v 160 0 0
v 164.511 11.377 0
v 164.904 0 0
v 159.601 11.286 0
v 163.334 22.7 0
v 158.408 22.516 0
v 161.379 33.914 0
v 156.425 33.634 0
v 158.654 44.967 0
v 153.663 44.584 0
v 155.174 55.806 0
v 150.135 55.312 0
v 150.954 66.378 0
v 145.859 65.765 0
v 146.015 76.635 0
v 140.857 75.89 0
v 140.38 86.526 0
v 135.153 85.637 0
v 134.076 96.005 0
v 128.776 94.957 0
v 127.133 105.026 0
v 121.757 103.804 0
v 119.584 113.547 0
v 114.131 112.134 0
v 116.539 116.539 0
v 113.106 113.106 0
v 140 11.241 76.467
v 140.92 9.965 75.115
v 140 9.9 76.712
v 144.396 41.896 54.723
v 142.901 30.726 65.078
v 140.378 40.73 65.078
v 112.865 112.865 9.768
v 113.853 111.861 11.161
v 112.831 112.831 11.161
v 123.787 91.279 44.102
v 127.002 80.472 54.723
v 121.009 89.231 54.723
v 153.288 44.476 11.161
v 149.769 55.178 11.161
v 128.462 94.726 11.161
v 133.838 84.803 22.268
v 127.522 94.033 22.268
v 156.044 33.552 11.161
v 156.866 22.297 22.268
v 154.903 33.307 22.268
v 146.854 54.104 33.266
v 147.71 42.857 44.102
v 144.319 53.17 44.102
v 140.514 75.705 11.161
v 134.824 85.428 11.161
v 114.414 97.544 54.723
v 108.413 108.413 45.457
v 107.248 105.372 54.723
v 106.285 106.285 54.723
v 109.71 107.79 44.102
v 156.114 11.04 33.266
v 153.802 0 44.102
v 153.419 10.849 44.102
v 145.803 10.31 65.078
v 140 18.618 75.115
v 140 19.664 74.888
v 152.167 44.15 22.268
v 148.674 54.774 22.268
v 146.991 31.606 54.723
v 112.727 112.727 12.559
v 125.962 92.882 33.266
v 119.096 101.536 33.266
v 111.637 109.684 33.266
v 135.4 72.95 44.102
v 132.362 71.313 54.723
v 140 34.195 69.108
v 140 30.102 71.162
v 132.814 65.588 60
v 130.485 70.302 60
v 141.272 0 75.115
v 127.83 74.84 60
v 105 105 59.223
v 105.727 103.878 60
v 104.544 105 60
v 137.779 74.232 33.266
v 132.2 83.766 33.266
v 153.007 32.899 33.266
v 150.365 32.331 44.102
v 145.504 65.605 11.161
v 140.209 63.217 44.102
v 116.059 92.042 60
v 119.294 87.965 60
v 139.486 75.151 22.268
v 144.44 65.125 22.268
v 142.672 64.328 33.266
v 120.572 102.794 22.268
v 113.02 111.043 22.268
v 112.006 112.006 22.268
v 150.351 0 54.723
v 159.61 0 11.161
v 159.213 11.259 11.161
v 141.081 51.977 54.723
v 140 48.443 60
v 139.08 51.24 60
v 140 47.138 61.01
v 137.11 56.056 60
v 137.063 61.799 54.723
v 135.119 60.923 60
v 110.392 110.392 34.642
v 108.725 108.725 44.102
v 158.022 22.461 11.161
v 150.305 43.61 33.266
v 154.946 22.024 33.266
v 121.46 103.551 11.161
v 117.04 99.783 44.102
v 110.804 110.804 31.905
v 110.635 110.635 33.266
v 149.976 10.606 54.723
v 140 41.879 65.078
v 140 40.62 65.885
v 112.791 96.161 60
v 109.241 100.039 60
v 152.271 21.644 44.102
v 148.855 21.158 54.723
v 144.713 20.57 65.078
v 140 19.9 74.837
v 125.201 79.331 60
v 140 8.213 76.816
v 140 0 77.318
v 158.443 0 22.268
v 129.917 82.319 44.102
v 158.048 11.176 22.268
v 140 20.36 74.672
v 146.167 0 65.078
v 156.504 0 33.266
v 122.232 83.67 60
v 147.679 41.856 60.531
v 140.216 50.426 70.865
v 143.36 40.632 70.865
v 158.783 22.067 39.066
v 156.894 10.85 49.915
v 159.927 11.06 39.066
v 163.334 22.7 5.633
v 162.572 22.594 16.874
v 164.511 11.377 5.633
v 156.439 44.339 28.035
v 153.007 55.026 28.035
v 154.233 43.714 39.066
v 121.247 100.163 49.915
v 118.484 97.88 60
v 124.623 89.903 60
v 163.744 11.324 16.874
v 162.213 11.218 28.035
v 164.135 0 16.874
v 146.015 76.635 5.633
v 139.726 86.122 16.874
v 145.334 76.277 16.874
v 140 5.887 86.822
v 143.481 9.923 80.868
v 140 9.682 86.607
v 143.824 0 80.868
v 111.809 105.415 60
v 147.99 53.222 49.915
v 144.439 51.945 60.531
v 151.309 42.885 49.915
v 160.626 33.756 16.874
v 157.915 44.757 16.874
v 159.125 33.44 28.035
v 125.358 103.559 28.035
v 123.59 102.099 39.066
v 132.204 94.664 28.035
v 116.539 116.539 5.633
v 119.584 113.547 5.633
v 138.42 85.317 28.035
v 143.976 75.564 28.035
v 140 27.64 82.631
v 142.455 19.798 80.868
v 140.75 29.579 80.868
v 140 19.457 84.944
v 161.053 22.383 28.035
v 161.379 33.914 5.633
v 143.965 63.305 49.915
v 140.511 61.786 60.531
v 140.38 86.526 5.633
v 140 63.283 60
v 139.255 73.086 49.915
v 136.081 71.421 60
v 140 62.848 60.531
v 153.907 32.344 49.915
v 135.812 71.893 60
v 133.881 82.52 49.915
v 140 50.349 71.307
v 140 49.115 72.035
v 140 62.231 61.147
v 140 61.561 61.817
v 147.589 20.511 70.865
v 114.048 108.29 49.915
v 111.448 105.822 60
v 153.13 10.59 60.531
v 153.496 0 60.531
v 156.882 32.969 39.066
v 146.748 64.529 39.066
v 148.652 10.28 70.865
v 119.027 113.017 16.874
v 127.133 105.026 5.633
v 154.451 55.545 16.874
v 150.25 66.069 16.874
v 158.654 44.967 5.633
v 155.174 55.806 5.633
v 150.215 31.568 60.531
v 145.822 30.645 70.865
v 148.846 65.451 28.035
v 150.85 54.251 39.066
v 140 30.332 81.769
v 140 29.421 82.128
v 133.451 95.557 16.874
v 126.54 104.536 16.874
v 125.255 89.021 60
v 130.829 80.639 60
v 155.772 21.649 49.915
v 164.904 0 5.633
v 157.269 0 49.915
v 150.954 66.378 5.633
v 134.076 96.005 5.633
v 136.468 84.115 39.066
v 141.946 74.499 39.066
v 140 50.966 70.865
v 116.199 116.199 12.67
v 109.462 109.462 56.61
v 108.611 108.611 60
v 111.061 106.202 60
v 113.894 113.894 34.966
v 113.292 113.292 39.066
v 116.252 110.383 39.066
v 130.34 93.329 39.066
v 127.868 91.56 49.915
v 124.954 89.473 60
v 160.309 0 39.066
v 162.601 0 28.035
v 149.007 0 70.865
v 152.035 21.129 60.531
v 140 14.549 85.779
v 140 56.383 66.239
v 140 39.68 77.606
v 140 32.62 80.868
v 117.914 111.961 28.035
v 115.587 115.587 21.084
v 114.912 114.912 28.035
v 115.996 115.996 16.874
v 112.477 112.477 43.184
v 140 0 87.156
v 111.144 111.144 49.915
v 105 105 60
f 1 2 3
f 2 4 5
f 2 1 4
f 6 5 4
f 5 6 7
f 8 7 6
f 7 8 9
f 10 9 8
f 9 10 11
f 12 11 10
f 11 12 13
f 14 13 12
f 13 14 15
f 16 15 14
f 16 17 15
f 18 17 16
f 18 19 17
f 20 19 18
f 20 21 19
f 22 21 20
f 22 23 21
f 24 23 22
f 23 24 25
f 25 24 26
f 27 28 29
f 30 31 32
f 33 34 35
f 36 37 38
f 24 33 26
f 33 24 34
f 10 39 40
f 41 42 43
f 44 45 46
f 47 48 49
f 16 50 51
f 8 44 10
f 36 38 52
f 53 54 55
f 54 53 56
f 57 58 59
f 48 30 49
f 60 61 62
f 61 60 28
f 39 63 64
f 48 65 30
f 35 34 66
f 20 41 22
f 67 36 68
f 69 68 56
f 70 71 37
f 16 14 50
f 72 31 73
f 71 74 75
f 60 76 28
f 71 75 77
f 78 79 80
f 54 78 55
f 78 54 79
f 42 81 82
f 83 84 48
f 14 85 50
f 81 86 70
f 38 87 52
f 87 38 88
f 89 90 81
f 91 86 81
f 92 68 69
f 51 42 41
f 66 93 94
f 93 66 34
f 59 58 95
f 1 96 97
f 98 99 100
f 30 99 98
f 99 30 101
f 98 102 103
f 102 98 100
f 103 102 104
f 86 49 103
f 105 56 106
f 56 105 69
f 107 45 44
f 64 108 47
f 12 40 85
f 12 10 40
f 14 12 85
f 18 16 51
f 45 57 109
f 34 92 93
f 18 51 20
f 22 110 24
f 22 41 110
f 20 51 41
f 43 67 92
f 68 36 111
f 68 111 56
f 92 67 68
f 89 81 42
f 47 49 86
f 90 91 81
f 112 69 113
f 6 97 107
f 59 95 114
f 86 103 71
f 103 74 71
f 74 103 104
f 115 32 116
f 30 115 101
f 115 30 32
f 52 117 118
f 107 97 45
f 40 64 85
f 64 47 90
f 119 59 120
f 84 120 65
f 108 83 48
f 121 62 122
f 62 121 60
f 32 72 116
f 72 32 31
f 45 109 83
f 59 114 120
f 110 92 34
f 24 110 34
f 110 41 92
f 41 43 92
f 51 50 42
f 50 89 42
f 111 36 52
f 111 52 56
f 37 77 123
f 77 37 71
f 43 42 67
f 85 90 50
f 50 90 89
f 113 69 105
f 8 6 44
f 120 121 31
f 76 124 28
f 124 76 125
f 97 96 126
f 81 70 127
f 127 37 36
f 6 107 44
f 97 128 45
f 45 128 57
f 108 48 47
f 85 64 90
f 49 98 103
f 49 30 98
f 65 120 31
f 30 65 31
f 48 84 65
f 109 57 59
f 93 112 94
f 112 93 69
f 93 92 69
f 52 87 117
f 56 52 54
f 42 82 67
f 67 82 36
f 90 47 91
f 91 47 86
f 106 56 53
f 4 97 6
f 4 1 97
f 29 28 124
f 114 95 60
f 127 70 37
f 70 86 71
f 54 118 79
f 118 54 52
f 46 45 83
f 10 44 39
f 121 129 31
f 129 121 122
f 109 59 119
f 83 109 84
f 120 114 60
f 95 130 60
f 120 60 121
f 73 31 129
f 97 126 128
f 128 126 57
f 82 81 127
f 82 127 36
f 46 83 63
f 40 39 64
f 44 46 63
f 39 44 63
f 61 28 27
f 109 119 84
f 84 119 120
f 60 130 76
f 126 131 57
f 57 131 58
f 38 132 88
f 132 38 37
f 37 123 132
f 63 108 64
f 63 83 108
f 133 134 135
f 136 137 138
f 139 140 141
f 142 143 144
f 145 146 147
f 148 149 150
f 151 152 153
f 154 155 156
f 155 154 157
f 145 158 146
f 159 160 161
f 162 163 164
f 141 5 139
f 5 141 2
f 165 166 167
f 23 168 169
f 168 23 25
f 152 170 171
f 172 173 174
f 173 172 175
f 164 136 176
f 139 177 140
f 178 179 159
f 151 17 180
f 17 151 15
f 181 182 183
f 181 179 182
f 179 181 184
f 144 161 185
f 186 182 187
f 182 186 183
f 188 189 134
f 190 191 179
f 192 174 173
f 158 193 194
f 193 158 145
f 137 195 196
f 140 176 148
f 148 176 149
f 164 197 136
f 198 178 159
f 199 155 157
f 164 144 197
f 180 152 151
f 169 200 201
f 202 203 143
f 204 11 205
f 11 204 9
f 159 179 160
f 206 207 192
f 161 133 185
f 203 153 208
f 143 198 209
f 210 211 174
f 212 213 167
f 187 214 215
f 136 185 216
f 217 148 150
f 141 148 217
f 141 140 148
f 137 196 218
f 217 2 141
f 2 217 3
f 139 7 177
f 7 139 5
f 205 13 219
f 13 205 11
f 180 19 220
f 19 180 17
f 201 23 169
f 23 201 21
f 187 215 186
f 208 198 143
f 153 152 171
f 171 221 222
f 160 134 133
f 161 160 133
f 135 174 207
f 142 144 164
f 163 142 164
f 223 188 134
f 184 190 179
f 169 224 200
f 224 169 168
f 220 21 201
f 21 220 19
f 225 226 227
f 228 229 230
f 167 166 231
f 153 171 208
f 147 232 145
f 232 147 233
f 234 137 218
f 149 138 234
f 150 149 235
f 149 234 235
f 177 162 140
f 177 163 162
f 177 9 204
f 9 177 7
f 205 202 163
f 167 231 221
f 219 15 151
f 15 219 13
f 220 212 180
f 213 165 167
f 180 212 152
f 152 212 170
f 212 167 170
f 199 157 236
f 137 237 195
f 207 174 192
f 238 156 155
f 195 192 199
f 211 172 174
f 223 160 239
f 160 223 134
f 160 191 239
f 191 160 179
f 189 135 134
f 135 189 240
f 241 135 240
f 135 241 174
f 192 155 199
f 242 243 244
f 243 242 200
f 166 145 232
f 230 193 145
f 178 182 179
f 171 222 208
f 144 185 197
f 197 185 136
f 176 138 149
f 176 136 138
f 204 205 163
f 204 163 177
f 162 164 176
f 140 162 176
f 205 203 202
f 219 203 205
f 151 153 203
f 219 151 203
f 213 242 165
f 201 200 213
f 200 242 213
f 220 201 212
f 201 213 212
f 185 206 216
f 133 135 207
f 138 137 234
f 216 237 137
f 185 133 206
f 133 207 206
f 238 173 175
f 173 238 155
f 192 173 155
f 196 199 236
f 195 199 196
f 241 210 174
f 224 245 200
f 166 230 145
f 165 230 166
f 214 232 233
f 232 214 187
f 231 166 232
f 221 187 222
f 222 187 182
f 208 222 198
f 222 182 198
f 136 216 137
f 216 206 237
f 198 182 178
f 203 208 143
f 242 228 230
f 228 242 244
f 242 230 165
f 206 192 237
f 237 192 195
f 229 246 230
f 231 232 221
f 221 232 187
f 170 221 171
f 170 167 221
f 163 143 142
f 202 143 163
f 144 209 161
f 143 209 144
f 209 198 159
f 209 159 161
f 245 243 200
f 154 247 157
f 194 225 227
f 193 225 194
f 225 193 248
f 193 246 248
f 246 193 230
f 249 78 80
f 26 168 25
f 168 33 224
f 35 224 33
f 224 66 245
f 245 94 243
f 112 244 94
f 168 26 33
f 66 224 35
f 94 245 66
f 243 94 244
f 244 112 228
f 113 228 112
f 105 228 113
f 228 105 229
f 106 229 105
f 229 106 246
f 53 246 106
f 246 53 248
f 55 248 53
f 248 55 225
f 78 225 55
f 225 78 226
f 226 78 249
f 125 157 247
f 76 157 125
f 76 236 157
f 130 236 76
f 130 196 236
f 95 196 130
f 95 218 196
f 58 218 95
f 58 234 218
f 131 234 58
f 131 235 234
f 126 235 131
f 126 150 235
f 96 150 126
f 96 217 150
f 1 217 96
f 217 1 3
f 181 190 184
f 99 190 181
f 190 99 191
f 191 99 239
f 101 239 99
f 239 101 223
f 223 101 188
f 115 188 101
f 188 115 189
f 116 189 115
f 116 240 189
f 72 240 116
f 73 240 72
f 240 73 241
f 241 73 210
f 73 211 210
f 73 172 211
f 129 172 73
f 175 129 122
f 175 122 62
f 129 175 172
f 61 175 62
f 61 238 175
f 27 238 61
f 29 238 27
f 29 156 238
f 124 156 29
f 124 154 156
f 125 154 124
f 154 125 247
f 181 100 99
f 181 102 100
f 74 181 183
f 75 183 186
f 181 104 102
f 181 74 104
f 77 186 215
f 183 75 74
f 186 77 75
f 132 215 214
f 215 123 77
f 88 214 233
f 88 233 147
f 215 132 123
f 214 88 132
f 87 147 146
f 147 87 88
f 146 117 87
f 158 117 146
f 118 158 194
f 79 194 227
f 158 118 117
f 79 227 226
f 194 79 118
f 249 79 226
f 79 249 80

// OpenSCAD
// file: ../motors/MN5212.scad
use <../utils.scad>

module MN5212(){

	render(){
		translate([0,0, 42.5 / 2 - 23 / 2 - 4.9 - 6])
			cylinder(
				h = 23,
				r = 59 / 2,
				$fa = fa(59 / 2),
				center = true);
		translate([0,0, 42.5 / 2 - 4.9 / 2 - 6])
			cylinder(
				h = 4.9,
				r1 = 59 / 2,
				r2 = 24.8 / 2,
				$fa = fa(59 / 2),
				center = true);
		translate([0,0, - 42.5 / 2 + 5.6 / 2 + 3])
			cylinder(
				h = 5.6,
				r1 = 44 / 2,
				r2 = 59 / 2,
				$fa = fa(59 / 2),
				center = true);
		translate([0, 0, 42.5 / 2 - 3])
			cylinder(
				h = 6,
				r = 4 / 2,
				$fa = fa(4 / 2),
				center = true);
		translate([0, 0, - 42.5 / 2 + 1.5])
			cylinder(
				h = 3,
				r = 6 / 2,
				$fa = fa(6 / 2),
				center = true);
	}

}
// file: ../servos/HS_5065MG.scad
use <../utils.scad>

module HS_5065MG(){

	length = 23.75;
	width = 11.68;
	depth = 20.32;
	wing_width = 32.38;
	wing_thick = 3.43;
	shaft_offset = 6;
	hole_spacing = 28.32;
	shaft_height = 26.16;
	shaft_length = 2;

	module mounting_hole(){
		mh_rad = 2 / 2;
		translate(
			[
				hole_spacing / 2,
				0,
				depth / 2 - wing_thick / 2
			])
			cylinder(h = 5, r = mh_rad, $fa = fa(mh_rad), center = true);
	}

	difference(){
		union(){
			cube([length, width, depth], center = true);
			translate([0, 0, depth / 2 - wing_thick / 2])
				cube([wing_width, width, wing_thick], center = true);
			translate(
				[
					- length / 2 + shaft_offset,
					0,
					shaft_height - length / 2 + shaft_length / 2
				])
				cylinder(
					h = shaft_length,
					r = 1.5,
					$fa = fa(1.5),
					center = true);
		}	union(){

			mounting_hole();
			mirror() mounting_hole();
		}
	}
}

HS_5065MG();
// file: ../servos/LS_0006_servo.scad
// Author Michael Marques (DrYerzinia)

use <../utils.scad>

module ls_0006_servo(){
	
	length = 21.4;
	depth = 19.9;
	thickness = 11.65;

	gear_height = 2.6;
	gear_bump_height = 0.7;
	gear_bump_diameter = 1.97;
	gear_outer_bump_diameter = 6;
	gear_bump_offset = 12.2;

	shaft_height = 2.4;
	shaft_diameter = 3.74;
	shaft_offset = thickness / 2;
	shaft_screw_diameter = 1.3;
	
	wing_outer_width = 8.5;
	wing_top_off = 3.8;
	wing_length = 3.8;
	wing_thickness = 1.2;
	wing_hole_diameter = 1.85;
	wing_hole_edge_dist = 2;

	module wing_hole(){
		translate(
			[
				length / 2 + wing_hole_edge_dist,
				0,
				depth/2 - wing_top_off - wing_thickness / 2
			])
			cylinder(
				h = wing_thickness + 1,
				r = wing_hole_diameter / 2,
				$fn = 16,
				center = true);
	}

	module wing(){
		translate(
			[
				length / 2,
				thickness / 2,
				depth/2 - wing_top_off - wing_thickness
			])
			rotate([0,0,-90])
				trapezoid(
					thickness,
					wing_outer_width,
					wing_length,
					wing_thickness);
	}

	// Body
	cube([length, thickness, depth], center = true);

	difference(){
		union(){

			wing();
			mirror() wing();

			// Gear Bumps
			translate([0, 0, depth/2 + gear_height / 2]){
				translate([length / 2 - gear_bump_offset, 0, 0])
					cylinder(
						h = gear_height,
						r = gear_outer_bump_diameter / 2,
						$fn = 16,
						center = true);
				translate([length / 2 - gear_bump_offset, 0, gear_height/2 + gear_bump_height / 2])
					cylinder(
						h = gear_bump_height,
						r = gear_bump_diameter / 2,
						$fn = 16,
						center = true);
				translate([length / 2 - shaft_offset, 0, 0])
					cylinder(
						h = gear_height,
						r = thickness / 2,
						$fn = 32,
						center = true);
				// Shaft
				translate([length / 2 - shaft_offset, 0, gear_height])
					cylinder(
						h = shaft_height,
						r = shaft_diameter / 2,
						$fn = 16,
						center = true);
			}

		}
		union(){

			wing_hole();
			mirror() wing_hole();

			// Shaft_hole
			translate(
				[
					length / 2 - shaft_offset,
					0,
					depth/2 + gear_height * (3 / 2) + 0.5])
				cylinder(
					h = shaft_height + 1,
					r = shaft_screw_diameter / 2,
					$fn = 16,
					center = true);

		}
	}

}

module translate_ls_0006_attachment(){

	length = 21.4;
	thickness = 11.65;
	shaft_offset = thickness / 2;
	depth = 19.9;
	float = 3.3;

	translate([length / 2 - shaft_offset, 0, depth / 2 + float])
		children();

}

module bar_attachment(){

	height = 3.75;
	bar_length = 14.7;
	bar_thickness = 1.6;
	inner_radius = 5.9;
	outer_radius = 3.95;
	shaft_diameter = 3.7;
	upper_void_diameter = 4.8;
	screw_diameter = 2;
	hole_spacing = 2;
	hole_4_diameter = 1.2;
	hole_diameter = 1;
	hole_start_off = 4.7;
	top_void_depth = 0.67;
	bottom_void_depth = 1.84;

	translate([0, 0, height / 2]){
		difference(){
			union(){

				translate([0, inner_radius / 2, height / 2 - bar_thickness])
					rotate([0,0,-90])
						trapezoid(
							inner_radius,
							outer_radius,
							bar_length,
							bar_thickness);

				cylinder(
					h = height,
					r = inner_radius / 2,
					$fn = 16,
					center = true);

				translate([bar_length, 0, height / 2 - bar_thickness / 2])
					cylinder(
						h = bar_thickness,
						r = outer_radius / 2,
						$fn = 16,
						center = true);

			}
			union(){
				// screwhole
				cylinder(
					h = height + 1,
					r = screw_diameter / 2,
					$fn = 16,
					center = true);
				// voids
				translate([0, 0, height / 2 - top_void_depth / 2 + 0.5])
					cylinder(
						h = top_void_depth + 1,
						r = upper_void_diameter / 2,
						$fn = 16,
						center = true);
				translate([0, 0,  - bottom_void_depth / 2 - 0.5])
					cylinder(
						h = bottom_void_depth + 1,
						r = shaft_diameter / 2,
						$fn = 16,
						center = true);

				for(i = [0:4]){
					dia = (i != 3) ? hole_diameter : hole_4_diameter;
					translate(
						[
							hole_start_off + hole_spacing * i,
							0,
							height / 2 - bar_thickness / 2])
						cylinder(
							h = bar_thickness + 1,
							r = dia / 2,
							$fn = 16,
							center = true);
				}

			}
		}
	}

}

ls_0006_servo();
translate_ls_0006_attachment() bar_attachment();
// file: ../servos/parallax_continuous_rotation_servo.scad
// Author Michael Marques (DrYerzinia)

module parallax_continuous_rotation_servo(){

	depth = 37.7;
	length = 40.75;
	width = 19.75;

	mount_height = 2.7;
	mount_extent = 6.1;
	mount_from_top = 7.7;

	mount_hole_diameter = 4.46;
	mount_hole_spacing = 14.4 - mount_hole_diameter;

	shaft_diameter = 5.8;
	shaft_offset = 10;
	shaft_length = 3.5;

	module mounting_hole(){

			translate(
				[
					length / 2 + 5,
					mount_hole_spacing / 2,
					depth / 2 - mount_height / 2 - mount_from_top
				]
				)
				cylinder(
					h = mount_height + 1,
					r = mount_hole_diameter / 2,
					$fn=16,
					center = true);
	}

	difference(){
		union(){

			// Body
			cube([length,width,depth], center = true);

			// Mounting wings
			translate(
				[
					0,
					0,
					depth / 2 - mount_height / 2 - mount_from_top
				])
				cube(
					[
						length + mount_extent * 2,
						width,
						mount_height
					],
					center = true);

			// Shaft
			translate(
				[
					length / 2 - shaft_offset,
					0,
					depth / 2 + shaft_length / 2
				]
				)
				cylinder(
					h = shaft_length,
					r = shaft_diameter / 2,
					$fn = 16,
					center = true
				);

		}
		union(){

			// Mounting Holes
			mounting_hole();
			mirror()
				mounting_hole();

			translate([0,-mount_hole_spacing,0]){
				mounting_hole();
				mirror()
					mounting_hole();
			}
		}
	}

}

module translate_shaft(){

	depth = 37.7;
	length = 40.75;

	shaft_offset = 10;

	translate(
		[
			length / 2 - shaft_offset,
			0,
			depth / 2
		])
		children();
}

module round_servo_attachment(){

	height = 6;
	diameter = 20.8;
	inner_diameter = 8.6;
	plate_thickness = 2.45;

	float = 2;

	depth = 37.7;
	length = 40.75;

	shaft_offset = 10;

	plate_hole_spacing = 14.5;
	plate_hole_diameter = 1.4;
	plate_hole_minor_spacing = 3.5;

	screw_hole_diameter = 3;

	inner_diameter = 8;
	
	top_depth = 1.8;
	bottom_depth = 3.4;

	void_diameter = 5.8;

	module plate_hole(){
		cylinder(
			h = plate_thickness + 1,
			r = plate_hole_diameter / 2,
			$fn = 16,
			center = true
		);
	}

	module plate_hole_group(){
		translate([0, 0, height / 2 - plate_thickness / 2]){
			translate([0, plate_hole_spacing / 2, 0]){
					plate_hole();
					translate([- plate_hole_minor_spacing, 0, 0])
						plate_hole();
					translate([  plate_hole_minor_spacing, 0, 0])
						plate_hole();
			}
		}
	}

	translate(
		[
			length / 2 - shaft_offset,
			0,
			depth / 2 + height / 2 + float
		]
		)
		difference(){

			union(){

				// inner shaft
				cylinder(
					h = height,
					r = inner_diameter / 2,
					$fn = 16,
					center = true
				);

				// top
				translate([0, 0, height / 2 - plate_thickness / 2])
					cylinder(
						h = plate_thickness,
						r = diameter / 2,
						$fn = 32,
						center = true
					);
			}

			union(){

				// plate holes
				for(ang = [0:3]){
					rotate([0,0, ang * 90])
						plate_hole_group();
				}

				// screw hole
				cylinder(
					h = height + 1,
					r = screw_hole_diameter / 2,
					$fn = 16,
					center = true
				);

				// inner voids
				translate([0, 0, height / 2 - top_depth / 2 + 1])
					cylinder(
						h = top_depth + 1,
						r = void_diameter / 2,
						$fn = 16,
						center = true
					);
				translate([0, 0, -1])
					cylinder(
						h = bottom_depth + 1,
						r = void_diameter / 2,
						$fn = 16,
						center = true
					);

			}

		}

}

parallax_continuous_rotation_servo();
round_servo_attachment();
// file: ../hardware.scad
 // Author Michael Marques (DrYerzinia)

// http://www.ebay.com/itm/10-PCS-683-3x7x2-mm-Metal-OPEN-PRECISION-Miniature-Ball-Bearing-3-7-2-/291206307942?hash=item43cd3fa066:m:mCi6eovrGVk_CjIUjlhw8yg
// E-Bay empire.rc

module washer_M3_7x3_2x0_5mm(){

	difference(){
		cylinder(
			h = 0.5,
			r = 7 / 2,
			$fn = 16,
			center = true);
		cylinder(
			h = 0.5 + 0.1,
			r = 3.2 / 2,
			$fn = 16,
			center = true);
	}

}

module bearing_3x7x2mm(){

	difference(){
		cylinder(
			h = 2,
			r = 7 / 2,
			$fn = 16,
			center = true);
		cylinder(
			h = 2 + 1,
			r = 3 / 2,
			$fn = 16,
			center = true);
	}

}

module bearing_5x8x2_5mm(){

	difference(){
		cylinder(
			h = 2.5,
			r = 8 / 2,
			$fn = 16,
			center = true);
		cylinder(
			h = 2.5 + 1,
			r = 5 / 2,
			$fn = 16,
			center = true);
	}

}

module bearing_8x16x5mm(){

	difference(){
		cylinder(
			h = 5,
			r = 16 / 2,
			$fn = 16,
			center = true);
		cylinder(
			h = 5 + 1,
			r = 8 / 2,
			$fn = 16,
			center = true);
	}

}


bearing_5x8x2_5mm();
// file: ../utils.scad
// http://forum.openscad.org/Creating-pie-pizza-slice-shape-need-a-dynamic-length-array-td3148.html

module pie_slice(r, start_angle, end_angle) {
    R = r * sqrt(2) + 1;
    a0 = (4 * start_angle + 0 * end_angle) / 4;
    a1 = (3 * start_angle + 1 * end_angle) / 4;
    a2 = (2 * start_angle + 2 * end_angle) / 4;
    a3 = (1 * start_angle + 3 * end_angle) / 4;
    a4 = (0 * start_angle + 4 * end_angle) / 4;
    if(end_angle > start_angle)
        intersection() {
        circle(r, $fa = fa(r));
        polygon([
            [0,0],
            [R * cos(a0), R * sin(a0)],
            [R * cos(a1), R * sin(a1)],
            [R * cos(a2), R * sin(a2)],
            [R * cos(a3), R * sin(a3)],
            [R * cos(a4), R * sin(a4)],
            [0,0]
       ]);
    }
}

// https://github.com/openscad/openscad/issues/29

module rotate_about(v,a) {
	translate(v) rotate(a) translate(-v) children(0);
}

module rotate_about_axis(v, ang, axis) {
	translate(v) rotate(ang, axis) translate(-v) children(0);
}

// https://github.com/robofun/openscad-utils/blob/master/trapezoid.scad

module trapezoid(width_base, width_top,height,thickness) {
	

  linear_extrude(height = thickness) polygon(points=[[0,0],[width_base,0],[width_base-(width_base-width_top)/2,height],[(width_base-width_top)/2,height]], paths=[[0,1,2,3]]); 
  
}

// http://forum.openscad.org/fe-Tolerance-based-arc-approximation-td14212.html

function fa(r)=($fn>0)?360/$fn:($fe>0)?($fe<r)?min(45,2*acos(1-$fe/r)):45:$fa; 
// file: ../render_settings.scad
// Author Michael Marques (DrYerzinia)

// Lulzbot Mini tolerances
// x/y 0.1mm
// z   0.05mm
//
// 0.1mm   preview tolerance
// 0.025mm export  tolerance

$fs = 0.01;
$fn = undef;
$fa = 360 / 5;

$fe = 0.025;	// export
// main file
// Author Michael Marques (DrYerzinia)

include <../render_settings.scad>

use <../BB8.scad>

Body_P4();
